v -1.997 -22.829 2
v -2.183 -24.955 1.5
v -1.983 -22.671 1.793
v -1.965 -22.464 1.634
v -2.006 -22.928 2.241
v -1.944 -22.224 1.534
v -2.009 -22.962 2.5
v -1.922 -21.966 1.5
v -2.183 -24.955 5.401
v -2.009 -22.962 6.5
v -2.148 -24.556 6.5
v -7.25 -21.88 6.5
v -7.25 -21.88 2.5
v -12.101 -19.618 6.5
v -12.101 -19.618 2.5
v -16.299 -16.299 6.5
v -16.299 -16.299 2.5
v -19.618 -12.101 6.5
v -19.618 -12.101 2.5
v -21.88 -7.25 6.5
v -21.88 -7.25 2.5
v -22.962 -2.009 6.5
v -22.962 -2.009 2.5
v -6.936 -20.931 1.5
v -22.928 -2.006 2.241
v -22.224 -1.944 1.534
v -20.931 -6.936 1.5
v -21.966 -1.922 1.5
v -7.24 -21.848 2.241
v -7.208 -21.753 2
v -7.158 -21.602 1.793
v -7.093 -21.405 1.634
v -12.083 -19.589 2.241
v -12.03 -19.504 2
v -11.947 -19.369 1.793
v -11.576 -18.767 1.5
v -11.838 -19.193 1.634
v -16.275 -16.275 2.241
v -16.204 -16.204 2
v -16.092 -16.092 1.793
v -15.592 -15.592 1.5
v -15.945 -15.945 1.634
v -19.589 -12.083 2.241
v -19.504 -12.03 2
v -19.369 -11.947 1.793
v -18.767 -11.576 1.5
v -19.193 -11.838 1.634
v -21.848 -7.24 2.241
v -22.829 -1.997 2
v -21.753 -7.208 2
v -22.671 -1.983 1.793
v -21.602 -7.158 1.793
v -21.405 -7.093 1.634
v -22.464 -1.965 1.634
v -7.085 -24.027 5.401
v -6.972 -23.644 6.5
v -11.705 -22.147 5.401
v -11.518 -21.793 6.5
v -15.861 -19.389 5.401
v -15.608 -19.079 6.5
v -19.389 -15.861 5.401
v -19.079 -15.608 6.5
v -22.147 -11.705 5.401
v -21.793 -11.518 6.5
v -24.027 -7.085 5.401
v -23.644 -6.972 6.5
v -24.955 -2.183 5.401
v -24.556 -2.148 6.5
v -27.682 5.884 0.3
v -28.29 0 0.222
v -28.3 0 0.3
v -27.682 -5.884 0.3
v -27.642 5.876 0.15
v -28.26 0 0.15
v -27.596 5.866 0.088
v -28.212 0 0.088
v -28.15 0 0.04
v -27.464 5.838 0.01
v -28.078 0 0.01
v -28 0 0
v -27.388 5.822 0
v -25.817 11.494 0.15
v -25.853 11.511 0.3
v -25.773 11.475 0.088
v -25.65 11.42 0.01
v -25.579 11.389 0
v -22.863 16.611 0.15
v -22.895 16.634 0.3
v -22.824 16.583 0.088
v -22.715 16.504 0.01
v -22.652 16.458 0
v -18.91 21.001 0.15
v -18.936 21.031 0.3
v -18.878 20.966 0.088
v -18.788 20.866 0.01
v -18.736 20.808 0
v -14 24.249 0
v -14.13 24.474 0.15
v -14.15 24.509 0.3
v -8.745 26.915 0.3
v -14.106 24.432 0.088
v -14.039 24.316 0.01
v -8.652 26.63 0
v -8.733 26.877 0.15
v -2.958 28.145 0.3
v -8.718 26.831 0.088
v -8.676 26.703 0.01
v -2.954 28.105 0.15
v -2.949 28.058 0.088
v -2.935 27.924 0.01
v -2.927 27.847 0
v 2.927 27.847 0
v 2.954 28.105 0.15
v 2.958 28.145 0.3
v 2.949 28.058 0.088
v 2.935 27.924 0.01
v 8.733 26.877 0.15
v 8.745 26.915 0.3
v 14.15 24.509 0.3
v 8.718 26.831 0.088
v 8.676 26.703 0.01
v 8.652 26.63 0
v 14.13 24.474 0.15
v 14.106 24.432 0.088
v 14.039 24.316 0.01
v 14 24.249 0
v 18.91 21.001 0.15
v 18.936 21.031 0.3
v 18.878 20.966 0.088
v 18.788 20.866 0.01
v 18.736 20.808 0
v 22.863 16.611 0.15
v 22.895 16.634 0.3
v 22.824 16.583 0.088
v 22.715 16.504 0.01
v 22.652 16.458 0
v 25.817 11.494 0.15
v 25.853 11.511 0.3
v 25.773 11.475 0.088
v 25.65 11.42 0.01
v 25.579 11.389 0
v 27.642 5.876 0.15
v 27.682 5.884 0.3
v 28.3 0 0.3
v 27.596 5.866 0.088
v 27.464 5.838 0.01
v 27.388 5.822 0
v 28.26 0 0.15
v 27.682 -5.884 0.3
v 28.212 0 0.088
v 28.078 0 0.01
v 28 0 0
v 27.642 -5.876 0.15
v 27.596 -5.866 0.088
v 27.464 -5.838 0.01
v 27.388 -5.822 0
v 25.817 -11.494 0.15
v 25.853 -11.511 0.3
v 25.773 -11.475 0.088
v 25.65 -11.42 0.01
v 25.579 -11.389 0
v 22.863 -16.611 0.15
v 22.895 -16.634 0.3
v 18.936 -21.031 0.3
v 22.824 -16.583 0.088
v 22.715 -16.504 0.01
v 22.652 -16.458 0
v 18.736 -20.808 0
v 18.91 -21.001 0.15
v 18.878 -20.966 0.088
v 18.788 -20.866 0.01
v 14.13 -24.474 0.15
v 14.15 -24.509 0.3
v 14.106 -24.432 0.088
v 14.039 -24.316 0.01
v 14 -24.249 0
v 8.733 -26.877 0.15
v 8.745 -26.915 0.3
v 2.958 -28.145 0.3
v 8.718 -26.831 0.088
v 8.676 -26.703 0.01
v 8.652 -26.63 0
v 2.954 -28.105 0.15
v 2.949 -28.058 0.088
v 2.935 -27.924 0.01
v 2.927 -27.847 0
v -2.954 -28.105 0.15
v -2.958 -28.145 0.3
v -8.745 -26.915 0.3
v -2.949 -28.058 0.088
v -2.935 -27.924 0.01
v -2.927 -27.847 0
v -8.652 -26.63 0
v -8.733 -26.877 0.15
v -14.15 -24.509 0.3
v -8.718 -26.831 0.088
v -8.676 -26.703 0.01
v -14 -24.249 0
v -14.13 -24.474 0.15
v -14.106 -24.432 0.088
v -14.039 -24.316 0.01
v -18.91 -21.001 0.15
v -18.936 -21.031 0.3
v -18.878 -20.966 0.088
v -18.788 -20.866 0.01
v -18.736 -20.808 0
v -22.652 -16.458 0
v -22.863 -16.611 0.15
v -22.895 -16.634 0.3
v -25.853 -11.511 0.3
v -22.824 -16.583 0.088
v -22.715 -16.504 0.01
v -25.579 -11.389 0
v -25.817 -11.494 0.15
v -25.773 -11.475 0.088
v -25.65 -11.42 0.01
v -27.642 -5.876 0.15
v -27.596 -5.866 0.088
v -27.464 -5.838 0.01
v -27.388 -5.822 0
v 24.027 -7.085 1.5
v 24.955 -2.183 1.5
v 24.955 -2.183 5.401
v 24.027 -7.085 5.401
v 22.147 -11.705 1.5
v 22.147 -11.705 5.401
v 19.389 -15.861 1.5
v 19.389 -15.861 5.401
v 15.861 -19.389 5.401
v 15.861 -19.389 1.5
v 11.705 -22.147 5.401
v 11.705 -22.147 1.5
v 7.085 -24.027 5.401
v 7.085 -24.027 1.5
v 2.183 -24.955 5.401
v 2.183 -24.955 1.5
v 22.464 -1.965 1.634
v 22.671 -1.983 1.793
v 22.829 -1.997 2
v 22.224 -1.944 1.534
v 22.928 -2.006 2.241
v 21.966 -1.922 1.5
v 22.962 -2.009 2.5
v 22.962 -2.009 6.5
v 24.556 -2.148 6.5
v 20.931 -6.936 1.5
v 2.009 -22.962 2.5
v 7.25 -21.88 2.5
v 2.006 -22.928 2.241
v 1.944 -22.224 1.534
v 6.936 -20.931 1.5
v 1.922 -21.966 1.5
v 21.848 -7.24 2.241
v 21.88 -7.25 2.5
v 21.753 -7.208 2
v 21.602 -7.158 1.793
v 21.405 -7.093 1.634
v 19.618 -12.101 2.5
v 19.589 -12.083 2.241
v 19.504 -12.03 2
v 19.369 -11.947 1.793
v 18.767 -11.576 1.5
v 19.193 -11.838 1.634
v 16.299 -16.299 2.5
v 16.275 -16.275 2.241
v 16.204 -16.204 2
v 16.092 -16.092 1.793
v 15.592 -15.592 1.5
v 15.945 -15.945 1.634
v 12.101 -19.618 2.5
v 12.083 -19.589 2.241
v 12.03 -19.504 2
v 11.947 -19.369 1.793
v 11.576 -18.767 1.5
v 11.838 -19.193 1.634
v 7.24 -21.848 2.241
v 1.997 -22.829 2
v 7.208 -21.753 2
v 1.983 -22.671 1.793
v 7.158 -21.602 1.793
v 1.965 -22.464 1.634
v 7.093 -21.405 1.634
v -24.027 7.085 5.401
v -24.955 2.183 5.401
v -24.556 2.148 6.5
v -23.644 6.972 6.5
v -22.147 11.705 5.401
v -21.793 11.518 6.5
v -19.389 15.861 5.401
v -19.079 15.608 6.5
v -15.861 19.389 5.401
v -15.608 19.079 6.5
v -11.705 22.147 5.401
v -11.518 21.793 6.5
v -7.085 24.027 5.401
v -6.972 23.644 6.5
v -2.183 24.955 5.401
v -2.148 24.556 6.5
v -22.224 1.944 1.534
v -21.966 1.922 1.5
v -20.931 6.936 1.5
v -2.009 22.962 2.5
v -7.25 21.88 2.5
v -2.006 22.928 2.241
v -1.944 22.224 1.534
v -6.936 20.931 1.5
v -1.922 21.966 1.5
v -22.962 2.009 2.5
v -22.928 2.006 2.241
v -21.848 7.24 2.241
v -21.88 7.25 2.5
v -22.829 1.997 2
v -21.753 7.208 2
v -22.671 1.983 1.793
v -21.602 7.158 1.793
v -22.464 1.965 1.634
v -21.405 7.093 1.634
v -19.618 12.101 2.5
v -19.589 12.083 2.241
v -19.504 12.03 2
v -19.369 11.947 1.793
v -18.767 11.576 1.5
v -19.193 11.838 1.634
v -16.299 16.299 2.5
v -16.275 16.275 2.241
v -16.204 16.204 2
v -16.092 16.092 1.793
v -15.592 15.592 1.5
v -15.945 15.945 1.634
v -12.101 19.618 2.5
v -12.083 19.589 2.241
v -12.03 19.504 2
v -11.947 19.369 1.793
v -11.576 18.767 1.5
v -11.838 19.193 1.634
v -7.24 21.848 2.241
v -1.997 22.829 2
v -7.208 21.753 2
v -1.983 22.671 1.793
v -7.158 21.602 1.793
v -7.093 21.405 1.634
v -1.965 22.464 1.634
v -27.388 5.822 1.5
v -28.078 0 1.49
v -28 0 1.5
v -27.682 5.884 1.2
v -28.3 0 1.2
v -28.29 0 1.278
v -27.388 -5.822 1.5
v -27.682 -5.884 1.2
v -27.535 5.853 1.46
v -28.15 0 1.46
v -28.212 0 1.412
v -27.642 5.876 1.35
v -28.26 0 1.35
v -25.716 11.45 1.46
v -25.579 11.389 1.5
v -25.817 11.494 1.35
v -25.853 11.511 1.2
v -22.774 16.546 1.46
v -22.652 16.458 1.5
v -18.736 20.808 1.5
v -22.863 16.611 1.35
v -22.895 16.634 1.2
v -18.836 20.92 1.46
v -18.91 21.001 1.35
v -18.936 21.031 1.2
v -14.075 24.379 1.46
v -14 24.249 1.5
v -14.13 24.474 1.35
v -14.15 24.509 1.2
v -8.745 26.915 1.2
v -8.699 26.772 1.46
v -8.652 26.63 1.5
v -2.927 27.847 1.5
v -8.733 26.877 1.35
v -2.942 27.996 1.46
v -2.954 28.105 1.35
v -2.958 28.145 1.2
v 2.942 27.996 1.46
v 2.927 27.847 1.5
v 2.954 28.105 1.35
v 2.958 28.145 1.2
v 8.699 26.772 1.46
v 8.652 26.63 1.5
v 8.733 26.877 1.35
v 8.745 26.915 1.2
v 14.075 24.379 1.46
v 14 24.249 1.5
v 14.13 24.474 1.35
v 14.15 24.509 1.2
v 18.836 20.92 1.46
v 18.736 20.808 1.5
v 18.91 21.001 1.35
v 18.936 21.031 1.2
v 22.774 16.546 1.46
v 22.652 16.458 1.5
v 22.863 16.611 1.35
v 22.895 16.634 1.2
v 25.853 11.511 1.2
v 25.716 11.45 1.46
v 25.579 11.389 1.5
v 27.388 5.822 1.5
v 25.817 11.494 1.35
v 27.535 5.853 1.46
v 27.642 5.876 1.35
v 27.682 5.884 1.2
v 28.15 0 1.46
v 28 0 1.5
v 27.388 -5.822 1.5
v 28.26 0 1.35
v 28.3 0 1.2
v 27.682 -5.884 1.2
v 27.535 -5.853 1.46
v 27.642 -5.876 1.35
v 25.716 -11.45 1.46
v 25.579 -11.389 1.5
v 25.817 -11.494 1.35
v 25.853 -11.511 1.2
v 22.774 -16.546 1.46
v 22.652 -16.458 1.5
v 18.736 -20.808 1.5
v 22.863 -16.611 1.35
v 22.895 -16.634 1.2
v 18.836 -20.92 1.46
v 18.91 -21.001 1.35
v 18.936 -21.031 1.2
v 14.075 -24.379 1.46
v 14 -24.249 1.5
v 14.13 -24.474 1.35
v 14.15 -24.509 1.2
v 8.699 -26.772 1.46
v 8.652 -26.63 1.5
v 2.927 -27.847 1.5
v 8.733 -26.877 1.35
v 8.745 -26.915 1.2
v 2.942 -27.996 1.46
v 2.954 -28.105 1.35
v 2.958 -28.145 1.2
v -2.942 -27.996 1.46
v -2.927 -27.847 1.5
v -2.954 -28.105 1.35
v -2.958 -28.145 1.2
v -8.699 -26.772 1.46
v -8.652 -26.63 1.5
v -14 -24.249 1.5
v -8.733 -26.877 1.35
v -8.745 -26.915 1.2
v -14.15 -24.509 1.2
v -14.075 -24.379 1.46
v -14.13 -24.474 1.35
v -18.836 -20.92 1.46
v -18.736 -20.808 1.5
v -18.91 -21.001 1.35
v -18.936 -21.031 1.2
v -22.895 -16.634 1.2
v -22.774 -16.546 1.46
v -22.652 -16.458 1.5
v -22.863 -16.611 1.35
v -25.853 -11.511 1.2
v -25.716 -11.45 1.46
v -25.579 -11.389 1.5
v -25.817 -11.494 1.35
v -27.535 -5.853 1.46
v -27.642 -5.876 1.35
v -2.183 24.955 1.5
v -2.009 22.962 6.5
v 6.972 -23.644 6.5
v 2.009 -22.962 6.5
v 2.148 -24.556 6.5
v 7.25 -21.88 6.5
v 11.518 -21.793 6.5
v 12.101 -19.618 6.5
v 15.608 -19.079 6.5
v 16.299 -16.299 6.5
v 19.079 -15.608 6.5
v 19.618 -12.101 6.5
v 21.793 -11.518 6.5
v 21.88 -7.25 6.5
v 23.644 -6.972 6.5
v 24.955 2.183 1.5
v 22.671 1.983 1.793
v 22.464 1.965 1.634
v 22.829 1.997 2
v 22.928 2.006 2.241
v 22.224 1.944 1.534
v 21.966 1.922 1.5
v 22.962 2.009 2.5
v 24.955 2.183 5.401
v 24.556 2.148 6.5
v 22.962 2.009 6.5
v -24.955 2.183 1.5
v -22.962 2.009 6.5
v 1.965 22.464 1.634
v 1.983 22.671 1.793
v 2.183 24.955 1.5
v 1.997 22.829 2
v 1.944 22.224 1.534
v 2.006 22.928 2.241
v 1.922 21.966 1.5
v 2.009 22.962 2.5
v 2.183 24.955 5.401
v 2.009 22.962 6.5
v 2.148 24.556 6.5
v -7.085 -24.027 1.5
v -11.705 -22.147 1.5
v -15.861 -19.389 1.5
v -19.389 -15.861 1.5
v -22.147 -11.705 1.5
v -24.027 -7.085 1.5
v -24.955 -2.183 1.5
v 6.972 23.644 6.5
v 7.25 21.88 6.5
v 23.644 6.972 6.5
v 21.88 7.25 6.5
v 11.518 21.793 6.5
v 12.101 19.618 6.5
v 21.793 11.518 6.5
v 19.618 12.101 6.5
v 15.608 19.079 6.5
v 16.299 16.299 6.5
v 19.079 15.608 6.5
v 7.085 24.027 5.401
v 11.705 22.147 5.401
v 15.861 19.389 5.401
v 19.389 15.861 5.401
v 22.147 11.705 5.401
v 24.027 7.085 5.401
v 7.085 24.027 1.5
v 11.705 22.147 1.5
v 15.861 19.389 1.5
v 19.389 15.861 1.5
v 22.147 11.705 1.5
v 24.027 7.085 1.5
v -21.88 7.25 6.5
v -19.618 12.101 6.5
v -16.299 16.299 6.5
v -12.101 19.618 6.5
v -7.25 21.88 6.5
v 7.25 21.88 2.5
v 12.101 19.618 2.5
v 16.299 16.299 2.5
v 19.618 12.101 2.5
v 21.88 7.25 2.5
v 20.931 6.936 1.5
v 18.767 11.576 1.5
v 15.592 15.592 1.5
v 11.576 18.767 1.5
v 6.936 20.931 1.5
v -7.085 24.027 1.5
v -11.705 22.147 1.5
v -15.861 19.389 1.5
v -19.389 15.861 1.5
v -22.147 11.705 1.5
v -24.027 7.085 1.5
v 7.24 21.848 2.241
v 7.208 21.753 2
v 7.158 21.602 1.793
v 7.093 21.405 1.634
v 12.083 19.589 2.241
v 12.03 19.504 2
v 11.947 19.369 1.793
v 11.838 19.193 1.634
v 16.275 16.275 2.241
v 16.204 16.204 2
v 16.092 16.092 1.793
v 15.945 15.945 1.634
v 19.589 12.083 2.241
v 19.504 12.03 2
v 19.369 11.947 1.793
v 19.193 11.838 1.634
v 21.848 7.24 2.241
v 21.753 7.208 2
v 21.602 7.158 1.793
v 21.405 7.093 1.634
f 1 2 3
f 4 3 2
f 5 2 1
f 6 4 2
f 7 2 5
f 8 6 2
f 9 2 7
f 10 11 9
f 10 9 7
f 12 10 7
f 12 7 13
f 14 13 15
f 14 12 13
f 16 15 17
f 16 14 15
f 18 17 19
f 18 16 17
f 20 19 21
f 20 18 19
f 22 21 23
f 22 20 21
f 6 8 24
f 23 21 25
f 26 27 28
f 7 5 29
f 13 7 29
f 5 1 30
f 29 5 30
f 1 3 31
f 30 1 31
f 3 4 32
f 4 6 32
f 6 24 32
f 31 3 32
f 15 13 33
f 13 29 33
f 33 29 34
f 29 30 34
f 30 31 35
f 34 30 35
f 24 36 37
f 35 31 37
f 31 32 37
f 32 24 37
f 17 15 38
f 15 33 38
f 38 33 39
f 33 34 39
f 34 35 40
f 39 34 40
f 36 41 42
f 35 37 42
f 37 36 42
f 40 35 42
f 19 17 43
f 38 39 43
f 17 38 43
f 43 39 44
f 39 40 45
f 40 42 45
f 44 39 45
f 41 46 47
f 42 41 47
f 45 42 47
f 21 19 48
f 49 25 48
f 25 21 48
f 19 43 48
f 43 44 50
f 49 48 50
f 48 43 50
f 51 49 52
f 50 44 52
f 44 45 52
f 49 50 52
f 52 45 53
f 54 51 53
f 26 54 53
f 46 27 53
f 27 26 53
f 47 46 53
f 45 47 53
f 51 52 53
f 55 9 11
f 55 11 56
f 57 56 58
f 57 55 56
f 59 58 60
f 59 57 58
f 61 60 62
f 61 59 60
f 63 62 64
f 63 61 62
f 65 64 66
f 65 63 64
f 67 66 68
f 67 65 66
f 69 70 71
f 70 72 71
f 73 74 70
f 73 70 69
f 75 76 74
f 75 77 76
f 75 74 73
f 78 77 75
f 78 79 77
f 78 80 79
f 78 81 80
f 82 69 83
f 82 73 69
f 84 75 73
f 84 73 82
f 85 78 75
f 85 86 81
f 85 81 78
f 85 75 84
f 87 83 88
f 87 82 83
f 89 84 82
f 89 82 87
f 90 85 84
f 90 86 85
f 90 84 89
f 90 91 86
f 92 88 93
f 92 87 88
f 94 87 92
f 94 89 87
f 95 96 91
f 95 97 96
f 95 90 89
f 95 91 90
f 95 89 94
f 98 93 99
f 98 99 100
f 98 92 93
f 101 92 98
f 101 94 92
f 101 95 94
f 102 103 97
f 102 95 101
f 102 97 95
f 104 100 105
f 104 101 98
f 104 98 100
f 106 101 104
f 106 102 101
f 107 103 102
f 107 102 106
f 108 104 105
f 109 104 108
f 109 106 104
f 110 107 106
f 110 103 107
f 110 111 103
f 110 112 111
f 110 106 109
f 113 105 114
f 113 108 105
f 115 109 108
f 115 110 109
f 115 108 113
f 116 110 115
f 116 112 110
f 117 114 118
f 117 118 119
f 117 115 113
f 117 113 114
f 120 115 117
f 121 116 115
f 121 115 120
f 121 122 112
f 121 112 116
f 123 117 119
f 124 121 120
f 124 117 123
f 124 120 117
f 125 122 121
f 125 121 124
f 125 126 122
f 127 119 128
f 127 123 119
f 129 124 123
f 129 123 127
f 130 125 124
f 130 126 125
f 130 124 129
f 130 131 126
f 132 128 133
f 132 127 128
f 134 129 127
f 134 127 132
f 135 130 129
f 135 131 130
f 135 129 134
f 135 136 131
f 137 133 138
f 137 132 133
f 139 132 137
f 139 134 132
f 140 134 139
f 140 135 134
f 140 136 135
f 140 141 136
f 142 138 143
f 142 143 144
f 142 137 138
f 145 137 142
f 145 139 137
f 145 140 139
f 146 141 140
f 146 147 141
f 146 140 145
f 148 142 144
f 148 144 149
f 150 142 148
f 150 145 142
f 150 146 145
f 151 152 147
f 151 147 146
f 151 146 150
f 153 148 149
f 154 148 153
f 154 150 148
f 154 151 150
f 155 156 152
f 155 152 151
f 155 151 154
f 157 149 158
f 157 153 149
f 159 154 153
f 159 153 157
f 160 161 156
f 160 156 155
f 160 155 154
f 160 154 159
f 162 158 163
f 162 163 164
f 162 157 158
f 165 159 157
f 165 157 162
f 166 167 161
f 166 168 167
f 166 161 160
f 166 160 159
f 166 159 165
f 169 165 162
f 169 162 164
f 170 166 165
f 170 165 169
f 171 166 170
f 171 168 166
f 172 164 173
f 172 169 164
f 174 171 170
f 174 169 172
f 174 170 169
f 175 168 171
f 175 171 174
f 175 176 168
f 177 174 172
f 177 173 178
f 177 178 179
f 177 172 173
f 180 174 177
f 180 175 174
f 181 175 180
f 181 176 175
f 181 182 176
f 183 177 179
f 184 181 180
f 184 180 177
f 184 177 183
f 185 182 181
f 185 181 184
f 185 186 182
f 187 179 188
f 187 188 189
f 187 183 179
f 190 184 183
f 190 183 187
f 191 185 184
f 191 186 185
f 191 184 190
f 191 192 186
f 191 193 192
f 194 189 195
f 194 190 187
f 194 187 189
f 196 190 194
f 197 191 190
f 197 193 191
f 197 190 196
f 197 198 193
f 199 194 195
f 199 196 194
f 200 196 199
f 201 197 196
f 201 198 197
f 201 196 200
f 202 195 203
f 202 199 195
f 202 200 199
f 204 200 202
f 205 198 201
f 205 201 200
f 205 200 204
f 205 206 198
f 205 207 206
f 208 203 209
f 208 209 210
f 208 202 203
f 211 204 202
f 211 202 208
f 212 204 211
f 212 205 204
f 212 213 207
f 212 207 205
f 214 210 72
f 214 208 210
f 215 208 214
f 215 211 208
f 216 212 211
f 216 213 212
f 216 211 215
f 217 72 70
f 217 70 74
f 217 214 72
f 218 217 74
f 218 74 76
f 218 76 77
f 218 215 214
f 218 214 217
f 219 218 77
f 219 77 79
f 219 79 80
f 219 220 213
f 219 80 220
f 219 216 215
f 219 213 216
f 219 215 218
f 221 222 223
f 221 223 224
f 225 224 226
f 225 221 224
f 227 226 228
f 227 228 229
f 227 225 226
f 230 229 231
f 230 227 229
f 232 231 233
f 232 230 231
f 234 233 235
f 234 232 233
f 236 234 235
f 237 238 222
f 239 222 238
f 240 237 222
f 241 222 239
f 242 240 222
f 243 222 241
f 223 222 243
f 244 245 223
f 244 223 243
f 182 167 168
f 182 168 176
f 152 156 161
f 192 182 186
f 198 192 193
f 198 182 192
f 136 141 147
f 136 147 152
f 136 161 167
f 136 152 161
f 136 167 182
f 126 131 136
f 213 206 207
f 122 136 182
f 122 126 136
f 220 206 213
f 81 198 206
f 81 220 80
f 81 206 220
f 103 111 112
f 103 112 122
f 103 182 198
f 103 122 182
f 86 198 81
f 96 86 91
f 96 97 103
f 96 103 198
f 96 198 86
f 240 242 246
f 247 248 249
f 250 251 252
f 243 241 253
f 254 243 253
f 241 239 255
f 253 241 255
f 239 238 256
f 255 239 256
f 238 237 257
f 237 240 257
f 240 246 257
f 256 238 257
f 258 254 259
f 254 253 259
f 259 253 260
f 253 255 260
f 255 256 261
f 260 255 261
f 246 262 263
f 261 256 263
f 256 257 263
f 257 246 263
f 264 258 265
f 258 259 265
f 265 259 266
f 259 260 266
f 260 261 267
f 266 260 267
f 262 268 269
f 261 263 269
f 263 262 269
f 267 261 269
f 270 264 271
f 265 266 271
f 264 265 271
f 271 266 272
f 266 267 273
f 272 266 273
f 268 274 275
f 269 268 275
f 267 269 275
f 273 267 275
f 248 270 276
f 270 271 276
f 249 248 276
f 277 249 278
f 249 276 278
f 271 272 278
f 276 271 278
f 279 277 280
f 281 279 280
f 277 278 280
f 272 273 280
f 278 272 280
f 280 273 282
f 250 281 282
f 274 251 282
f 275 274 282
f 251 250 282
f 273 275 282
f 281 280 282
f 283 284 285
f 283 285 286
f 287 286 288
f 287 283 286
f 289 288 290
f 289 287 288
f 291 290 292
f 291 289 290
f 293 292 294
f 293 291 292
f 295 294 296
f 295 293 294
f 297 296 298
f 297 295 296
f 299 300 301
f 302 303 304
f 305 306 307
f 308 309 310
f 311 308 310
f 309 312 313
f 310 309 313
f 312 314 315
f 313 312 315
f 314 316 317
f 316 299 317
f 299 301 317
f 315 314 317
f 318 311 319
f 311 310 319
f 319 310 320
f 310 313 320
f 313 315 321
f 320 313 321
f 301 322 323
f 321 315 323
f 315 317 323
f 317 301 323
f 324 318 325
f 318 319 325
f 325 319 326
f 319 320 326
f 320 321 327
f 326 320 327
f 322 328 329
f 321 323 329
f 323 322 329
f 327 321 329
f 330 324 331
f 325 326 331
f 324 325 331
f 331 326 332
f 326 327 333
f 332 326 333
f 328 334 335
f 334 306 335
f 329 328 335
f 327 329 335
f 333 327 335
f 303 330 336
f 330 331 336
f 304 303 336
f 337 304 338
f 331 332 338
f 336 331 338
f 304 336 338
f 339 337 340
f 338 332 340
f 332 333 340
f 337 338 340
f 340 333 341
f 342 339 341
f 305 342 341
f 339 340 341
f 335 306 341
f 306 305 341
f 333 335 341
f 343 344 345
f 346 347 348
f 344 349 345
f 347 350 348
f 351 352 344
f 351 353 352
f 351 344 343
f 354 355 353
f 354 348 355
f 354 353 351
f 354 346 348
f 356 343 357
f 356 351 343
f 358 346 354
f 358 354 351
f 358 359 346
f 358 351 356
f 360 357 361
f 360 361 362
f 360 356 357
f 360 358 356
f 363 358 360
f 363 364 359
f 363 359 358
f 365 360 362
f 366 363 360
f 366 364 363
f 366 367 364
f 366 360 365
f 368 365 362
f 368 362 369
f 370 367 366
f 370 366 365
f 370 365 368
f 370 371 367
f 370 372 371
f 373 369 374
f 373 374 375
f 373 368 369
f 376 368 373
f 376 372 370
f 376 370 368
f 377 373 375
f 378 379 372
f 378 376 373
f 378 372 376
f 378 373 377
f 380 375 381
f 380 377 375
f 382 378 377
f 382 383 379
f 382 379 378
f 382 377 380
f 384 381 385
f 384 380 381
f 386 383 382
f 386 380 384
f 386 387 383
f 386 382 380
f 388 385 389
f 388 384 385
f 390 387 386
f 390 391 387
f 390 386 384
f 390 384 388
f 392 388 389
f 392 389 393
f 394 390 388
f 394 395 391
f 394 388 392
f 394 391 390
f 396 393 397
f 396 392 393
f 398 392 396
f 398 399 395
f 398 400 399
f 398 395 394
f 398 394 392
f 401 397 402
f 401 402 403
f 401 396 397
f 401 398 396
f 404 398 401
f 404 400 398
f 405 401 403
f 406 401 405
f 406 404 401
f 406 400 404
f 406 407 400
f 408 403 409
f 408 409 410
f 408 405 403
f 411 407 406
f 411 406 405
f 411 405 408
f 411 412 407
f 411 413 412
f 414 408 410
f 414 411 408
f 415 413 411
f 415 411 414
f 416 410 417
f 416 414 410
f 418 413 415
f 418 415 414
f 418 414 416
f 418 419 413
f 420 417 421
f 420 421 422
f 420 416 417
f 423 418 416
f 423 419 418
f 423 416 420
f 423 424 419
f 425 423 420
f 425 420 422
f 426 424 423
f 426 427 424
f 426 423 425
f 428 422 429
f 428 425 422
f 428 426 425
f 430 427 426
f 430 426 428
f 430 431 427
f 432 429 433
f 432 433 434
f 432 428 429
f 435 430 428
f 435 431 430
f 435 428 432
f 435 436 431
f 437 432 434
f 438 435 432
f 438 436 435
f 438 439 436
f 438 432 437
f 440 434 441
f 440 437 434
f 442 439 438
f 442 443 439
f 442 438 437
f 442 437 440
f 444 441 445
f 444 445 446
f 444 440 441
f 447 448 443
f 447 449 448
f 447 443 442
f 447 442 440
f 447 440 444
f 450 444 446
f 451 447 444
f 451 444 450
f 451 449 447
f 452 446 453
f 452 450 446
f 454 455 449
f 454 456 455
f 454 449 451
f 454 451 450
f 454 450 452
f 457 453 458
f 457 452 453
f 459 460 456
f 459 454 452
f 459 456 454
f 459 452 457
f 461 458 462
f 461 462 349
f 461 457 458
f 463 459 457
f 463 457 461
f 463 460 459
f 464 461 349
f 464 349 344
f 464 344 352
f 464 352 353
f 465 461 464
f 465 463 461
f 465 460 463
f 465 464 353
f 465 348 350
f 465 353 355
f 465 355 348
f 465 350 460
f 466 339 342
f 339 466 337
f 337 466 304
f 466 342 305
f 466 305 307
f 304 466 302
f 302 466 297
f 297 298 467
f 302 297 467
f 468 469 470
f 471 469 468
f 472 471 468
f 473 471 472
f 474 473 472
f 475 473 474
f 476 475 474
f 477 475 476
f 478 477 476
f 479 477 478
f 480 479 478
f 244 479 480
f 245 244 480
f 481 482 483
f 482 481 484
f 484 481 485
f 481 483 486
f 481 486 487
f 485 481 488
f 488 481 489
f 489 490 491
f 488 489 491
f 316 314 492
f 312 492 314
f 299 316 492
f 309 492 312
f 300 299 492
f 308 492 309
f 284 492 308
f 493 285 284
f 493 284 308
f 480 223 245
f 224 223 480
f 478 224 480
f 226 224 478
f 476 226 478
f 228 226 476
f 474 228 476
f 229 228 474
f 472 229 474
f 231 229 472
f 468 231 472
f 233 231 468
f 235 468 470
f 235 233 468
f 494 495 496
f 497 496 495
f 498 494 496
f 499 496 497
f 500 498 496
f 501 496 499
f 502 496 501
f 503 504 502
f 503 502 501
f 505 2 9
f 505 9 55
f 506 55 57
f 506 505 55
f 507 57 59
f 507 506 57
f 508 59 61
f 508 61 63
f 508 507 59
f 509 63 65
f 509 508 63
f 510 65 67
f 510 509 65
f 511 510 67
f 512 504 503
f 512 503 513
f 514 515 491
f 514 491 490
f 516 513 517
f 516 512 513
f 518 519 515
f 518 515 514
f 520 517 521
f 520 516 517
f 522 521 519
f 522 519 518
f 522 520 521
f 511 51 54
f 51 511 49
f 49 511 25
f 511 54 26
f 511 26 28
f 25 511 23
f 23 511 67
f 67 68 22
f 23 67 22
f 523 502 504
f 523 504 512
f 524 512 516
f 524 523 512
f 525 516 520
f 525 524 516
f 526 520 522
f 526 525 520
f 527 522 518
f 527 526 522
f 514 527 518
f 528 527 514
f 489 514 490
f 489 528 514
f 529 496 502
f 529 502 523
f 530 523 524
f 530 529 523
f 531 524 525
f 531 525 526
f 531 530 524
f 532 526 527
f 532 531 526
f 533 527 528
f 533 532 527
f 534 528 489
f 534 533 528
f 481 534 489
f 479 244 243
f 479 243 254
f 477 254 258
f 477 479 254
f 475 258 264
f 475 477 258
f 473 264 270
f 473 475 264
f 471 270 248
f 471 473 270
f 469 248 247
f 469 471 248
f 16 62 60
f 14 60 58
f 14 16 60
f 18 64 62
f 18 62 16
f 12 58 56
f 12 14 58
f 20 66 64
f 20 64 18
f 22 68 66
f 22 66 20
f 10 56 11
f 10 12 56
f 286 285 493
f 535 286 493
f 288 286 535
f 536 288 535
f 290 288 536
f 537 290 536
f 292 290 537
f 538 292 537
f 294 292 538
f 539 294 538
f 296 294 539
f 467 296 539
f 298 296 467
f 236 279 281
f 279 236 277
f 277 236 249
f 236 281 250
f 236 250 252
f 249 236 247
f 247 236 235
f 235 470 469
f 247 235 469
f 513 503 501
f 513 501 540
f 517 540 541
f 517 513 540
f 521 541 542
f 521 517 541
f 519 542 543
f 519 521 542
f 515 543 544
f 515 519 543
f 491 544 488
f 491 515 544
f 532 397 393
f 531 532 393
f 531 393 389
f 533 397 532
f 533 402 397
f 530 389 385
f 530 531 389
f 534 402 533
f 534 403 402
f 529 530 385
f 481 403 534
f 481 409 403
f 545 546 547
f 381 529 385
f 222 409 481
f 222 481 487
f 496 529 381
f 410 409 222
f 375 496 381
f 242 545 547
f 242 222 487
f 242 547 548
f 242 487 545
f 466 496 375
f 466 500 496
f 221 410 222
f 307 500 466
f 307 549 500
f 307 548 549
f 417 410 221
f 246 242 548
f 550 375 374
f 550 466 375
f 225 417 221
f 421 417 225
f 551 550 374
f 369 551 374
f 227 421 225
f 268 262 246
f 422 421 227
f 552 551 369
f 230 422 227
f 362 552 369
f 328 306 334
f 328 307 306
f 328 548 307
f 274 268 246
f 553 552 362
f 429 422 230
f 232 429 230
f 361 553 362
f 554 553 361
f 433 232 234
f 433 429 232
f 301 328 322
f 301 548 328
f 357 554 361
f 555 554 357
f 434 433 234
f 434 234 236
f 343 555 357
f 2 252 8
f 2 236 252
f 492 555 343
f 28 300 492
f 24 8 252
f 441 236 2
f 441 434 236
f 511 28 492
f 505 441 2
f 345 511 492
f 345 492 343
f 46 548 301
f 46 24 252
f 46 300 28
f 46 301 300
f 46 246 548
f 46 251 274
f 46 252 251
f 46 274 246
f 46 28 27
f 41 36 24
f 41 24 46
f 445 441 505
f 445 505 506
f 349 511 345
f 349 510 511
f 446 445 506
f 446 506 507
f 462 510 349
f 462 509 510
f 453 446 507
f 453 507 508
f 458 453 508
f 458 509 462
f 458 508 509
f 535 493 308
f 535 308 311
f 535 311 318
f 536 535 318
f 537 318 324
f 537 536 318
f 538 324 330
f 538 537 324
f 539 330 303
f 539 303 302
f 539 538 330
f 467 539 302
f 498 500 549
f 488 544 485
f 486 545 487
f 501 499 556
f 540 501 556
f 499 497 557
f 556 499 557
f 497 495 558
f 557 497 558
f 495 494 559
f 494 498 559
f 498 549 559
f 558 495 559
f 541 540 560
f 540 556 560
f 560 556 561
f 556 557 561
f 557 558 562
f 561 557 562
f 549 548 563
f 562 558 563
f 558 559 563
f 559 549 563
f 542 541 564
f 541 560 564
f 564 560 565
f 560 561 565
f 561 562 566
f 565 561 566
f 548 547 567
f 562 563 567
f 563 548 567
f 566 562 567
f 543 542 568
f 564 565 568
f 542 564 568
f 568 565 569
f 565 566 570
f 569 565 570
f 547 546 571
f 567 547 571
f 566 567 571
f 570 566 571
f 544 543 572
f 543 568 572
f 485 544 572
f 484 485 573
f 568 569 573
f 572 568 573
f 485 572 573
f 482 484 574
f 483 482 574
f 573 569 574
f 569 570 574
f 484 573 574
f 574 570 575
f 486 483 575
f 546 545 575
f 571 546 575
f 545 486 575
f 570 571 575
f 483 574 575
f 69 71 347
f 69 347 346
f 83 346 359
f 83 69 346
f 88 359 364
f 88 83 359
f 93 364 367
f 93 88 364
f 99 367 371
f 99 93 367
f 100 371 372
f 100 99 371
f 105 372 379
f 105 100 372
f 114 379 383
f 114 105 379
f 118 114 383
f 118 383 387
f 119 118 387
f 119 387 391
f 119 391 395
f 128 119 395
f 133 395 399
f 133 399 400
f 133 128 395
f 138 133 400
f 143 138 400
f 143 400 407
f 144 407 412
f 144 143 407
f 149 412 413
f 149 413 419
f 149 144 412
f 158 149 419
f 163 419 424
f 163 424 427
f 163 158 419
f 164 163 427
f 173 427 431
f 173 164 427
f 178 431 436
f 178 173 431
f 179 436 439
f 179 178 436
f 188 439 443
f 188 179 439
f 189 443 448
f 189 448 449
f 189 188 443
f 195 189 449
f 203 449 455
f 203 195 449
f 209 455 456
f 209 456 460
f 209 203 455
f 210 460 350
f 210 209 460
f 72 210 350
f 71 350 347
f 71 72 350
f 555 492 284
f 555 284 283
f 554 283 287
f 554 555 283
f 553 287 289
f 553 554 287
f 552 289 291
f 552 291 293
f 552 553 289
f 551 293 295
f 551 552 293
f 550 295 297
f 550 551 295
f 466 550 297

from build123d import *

# Parameters (mm, degrees)
F2_SIZE2        = 1.0989909678
F2_SIZE         = 0.4
F4_R            = 1
F3_W            = 7.3154903948
F3_H            = 6.1171914935
F5_ANGLE_BACK   = 5
F5_ANGLE        = 10
F5_COPIES_COUNT = 4
F6_R            = 0.3


# Not quite as in the source:
# - a pattern or mirror of a feature is missing from the dataset's text; its kind, count and spacing are read off the source's solid


with BuildPart() as f1:
    # F0 (on Front) → F1 (revolve)
    with BuildSketch(Plane.XZ):
        Polygon((-28.3, 0), (0, 0), (0, 1.5), (-23.05, 1.5), (-23.05, 6.5), (-25.05, 6.5), (-25.05, 1.5), (-28.3, 1.5), align=None)
    revolve(axis=Axis((0, 0, -0.5399994552), (0, 0, -1)))

    # F2
    f2_edges = [f1.edges().sort_by_distance(p)[0] for p in [
        (25.05, 0, 6.5),
    ]]
    chamfer(f2_edges, length=F2_SIZE, length2=F2_SIZE2)

    # F4
    f4_edges = [f1.edges().sort_by_distance(p)[0] for p in [
        (23.05, 0, 1.5),
    ]]
    fillet(f4_edges, radius=F4_R)

    # F3 (on Front) → F5 (revolve, cut)
    with BuildSketch(Plane.XZ, mode=Mode.PRIVATE) as f5_sk:
        with Locations((-22.2290772945, 4.5585957468)):
            Rectangle(F3_W, F3_H)
    f5 = revolve(f5_sk.sketch.rotate(Axis((0, 0, 7.0531656966), (0, 0, 1)), -F5_ANGLE_BACK), axis=Axis((0, 0, 7.0531656966), (0, 0, 1)), revolution_arc=F5_ANGLE, mode=Mode.SUBTRACT)

    # F5_copies: F5 ×4 about axis
    f5_copies_axis = Axis((0, 0, 0), (0, 0, 1))
    for i in range(1, F5_COPIES_COUNT):
        add(f5.rotate(f5_copies_axis, i * 360 / F5_COPIES_COUNT), mode=Mode.SUBTRACT)

    # F6
    f6_edges = [f1.edges().sort_by_distance(p)[0] for p in [
        (28.3, 0, 1.5),
        (28.3, 0, 0),
    ]]
    fillet(f6_edges, radius=F6_R)


solid = f1.part
